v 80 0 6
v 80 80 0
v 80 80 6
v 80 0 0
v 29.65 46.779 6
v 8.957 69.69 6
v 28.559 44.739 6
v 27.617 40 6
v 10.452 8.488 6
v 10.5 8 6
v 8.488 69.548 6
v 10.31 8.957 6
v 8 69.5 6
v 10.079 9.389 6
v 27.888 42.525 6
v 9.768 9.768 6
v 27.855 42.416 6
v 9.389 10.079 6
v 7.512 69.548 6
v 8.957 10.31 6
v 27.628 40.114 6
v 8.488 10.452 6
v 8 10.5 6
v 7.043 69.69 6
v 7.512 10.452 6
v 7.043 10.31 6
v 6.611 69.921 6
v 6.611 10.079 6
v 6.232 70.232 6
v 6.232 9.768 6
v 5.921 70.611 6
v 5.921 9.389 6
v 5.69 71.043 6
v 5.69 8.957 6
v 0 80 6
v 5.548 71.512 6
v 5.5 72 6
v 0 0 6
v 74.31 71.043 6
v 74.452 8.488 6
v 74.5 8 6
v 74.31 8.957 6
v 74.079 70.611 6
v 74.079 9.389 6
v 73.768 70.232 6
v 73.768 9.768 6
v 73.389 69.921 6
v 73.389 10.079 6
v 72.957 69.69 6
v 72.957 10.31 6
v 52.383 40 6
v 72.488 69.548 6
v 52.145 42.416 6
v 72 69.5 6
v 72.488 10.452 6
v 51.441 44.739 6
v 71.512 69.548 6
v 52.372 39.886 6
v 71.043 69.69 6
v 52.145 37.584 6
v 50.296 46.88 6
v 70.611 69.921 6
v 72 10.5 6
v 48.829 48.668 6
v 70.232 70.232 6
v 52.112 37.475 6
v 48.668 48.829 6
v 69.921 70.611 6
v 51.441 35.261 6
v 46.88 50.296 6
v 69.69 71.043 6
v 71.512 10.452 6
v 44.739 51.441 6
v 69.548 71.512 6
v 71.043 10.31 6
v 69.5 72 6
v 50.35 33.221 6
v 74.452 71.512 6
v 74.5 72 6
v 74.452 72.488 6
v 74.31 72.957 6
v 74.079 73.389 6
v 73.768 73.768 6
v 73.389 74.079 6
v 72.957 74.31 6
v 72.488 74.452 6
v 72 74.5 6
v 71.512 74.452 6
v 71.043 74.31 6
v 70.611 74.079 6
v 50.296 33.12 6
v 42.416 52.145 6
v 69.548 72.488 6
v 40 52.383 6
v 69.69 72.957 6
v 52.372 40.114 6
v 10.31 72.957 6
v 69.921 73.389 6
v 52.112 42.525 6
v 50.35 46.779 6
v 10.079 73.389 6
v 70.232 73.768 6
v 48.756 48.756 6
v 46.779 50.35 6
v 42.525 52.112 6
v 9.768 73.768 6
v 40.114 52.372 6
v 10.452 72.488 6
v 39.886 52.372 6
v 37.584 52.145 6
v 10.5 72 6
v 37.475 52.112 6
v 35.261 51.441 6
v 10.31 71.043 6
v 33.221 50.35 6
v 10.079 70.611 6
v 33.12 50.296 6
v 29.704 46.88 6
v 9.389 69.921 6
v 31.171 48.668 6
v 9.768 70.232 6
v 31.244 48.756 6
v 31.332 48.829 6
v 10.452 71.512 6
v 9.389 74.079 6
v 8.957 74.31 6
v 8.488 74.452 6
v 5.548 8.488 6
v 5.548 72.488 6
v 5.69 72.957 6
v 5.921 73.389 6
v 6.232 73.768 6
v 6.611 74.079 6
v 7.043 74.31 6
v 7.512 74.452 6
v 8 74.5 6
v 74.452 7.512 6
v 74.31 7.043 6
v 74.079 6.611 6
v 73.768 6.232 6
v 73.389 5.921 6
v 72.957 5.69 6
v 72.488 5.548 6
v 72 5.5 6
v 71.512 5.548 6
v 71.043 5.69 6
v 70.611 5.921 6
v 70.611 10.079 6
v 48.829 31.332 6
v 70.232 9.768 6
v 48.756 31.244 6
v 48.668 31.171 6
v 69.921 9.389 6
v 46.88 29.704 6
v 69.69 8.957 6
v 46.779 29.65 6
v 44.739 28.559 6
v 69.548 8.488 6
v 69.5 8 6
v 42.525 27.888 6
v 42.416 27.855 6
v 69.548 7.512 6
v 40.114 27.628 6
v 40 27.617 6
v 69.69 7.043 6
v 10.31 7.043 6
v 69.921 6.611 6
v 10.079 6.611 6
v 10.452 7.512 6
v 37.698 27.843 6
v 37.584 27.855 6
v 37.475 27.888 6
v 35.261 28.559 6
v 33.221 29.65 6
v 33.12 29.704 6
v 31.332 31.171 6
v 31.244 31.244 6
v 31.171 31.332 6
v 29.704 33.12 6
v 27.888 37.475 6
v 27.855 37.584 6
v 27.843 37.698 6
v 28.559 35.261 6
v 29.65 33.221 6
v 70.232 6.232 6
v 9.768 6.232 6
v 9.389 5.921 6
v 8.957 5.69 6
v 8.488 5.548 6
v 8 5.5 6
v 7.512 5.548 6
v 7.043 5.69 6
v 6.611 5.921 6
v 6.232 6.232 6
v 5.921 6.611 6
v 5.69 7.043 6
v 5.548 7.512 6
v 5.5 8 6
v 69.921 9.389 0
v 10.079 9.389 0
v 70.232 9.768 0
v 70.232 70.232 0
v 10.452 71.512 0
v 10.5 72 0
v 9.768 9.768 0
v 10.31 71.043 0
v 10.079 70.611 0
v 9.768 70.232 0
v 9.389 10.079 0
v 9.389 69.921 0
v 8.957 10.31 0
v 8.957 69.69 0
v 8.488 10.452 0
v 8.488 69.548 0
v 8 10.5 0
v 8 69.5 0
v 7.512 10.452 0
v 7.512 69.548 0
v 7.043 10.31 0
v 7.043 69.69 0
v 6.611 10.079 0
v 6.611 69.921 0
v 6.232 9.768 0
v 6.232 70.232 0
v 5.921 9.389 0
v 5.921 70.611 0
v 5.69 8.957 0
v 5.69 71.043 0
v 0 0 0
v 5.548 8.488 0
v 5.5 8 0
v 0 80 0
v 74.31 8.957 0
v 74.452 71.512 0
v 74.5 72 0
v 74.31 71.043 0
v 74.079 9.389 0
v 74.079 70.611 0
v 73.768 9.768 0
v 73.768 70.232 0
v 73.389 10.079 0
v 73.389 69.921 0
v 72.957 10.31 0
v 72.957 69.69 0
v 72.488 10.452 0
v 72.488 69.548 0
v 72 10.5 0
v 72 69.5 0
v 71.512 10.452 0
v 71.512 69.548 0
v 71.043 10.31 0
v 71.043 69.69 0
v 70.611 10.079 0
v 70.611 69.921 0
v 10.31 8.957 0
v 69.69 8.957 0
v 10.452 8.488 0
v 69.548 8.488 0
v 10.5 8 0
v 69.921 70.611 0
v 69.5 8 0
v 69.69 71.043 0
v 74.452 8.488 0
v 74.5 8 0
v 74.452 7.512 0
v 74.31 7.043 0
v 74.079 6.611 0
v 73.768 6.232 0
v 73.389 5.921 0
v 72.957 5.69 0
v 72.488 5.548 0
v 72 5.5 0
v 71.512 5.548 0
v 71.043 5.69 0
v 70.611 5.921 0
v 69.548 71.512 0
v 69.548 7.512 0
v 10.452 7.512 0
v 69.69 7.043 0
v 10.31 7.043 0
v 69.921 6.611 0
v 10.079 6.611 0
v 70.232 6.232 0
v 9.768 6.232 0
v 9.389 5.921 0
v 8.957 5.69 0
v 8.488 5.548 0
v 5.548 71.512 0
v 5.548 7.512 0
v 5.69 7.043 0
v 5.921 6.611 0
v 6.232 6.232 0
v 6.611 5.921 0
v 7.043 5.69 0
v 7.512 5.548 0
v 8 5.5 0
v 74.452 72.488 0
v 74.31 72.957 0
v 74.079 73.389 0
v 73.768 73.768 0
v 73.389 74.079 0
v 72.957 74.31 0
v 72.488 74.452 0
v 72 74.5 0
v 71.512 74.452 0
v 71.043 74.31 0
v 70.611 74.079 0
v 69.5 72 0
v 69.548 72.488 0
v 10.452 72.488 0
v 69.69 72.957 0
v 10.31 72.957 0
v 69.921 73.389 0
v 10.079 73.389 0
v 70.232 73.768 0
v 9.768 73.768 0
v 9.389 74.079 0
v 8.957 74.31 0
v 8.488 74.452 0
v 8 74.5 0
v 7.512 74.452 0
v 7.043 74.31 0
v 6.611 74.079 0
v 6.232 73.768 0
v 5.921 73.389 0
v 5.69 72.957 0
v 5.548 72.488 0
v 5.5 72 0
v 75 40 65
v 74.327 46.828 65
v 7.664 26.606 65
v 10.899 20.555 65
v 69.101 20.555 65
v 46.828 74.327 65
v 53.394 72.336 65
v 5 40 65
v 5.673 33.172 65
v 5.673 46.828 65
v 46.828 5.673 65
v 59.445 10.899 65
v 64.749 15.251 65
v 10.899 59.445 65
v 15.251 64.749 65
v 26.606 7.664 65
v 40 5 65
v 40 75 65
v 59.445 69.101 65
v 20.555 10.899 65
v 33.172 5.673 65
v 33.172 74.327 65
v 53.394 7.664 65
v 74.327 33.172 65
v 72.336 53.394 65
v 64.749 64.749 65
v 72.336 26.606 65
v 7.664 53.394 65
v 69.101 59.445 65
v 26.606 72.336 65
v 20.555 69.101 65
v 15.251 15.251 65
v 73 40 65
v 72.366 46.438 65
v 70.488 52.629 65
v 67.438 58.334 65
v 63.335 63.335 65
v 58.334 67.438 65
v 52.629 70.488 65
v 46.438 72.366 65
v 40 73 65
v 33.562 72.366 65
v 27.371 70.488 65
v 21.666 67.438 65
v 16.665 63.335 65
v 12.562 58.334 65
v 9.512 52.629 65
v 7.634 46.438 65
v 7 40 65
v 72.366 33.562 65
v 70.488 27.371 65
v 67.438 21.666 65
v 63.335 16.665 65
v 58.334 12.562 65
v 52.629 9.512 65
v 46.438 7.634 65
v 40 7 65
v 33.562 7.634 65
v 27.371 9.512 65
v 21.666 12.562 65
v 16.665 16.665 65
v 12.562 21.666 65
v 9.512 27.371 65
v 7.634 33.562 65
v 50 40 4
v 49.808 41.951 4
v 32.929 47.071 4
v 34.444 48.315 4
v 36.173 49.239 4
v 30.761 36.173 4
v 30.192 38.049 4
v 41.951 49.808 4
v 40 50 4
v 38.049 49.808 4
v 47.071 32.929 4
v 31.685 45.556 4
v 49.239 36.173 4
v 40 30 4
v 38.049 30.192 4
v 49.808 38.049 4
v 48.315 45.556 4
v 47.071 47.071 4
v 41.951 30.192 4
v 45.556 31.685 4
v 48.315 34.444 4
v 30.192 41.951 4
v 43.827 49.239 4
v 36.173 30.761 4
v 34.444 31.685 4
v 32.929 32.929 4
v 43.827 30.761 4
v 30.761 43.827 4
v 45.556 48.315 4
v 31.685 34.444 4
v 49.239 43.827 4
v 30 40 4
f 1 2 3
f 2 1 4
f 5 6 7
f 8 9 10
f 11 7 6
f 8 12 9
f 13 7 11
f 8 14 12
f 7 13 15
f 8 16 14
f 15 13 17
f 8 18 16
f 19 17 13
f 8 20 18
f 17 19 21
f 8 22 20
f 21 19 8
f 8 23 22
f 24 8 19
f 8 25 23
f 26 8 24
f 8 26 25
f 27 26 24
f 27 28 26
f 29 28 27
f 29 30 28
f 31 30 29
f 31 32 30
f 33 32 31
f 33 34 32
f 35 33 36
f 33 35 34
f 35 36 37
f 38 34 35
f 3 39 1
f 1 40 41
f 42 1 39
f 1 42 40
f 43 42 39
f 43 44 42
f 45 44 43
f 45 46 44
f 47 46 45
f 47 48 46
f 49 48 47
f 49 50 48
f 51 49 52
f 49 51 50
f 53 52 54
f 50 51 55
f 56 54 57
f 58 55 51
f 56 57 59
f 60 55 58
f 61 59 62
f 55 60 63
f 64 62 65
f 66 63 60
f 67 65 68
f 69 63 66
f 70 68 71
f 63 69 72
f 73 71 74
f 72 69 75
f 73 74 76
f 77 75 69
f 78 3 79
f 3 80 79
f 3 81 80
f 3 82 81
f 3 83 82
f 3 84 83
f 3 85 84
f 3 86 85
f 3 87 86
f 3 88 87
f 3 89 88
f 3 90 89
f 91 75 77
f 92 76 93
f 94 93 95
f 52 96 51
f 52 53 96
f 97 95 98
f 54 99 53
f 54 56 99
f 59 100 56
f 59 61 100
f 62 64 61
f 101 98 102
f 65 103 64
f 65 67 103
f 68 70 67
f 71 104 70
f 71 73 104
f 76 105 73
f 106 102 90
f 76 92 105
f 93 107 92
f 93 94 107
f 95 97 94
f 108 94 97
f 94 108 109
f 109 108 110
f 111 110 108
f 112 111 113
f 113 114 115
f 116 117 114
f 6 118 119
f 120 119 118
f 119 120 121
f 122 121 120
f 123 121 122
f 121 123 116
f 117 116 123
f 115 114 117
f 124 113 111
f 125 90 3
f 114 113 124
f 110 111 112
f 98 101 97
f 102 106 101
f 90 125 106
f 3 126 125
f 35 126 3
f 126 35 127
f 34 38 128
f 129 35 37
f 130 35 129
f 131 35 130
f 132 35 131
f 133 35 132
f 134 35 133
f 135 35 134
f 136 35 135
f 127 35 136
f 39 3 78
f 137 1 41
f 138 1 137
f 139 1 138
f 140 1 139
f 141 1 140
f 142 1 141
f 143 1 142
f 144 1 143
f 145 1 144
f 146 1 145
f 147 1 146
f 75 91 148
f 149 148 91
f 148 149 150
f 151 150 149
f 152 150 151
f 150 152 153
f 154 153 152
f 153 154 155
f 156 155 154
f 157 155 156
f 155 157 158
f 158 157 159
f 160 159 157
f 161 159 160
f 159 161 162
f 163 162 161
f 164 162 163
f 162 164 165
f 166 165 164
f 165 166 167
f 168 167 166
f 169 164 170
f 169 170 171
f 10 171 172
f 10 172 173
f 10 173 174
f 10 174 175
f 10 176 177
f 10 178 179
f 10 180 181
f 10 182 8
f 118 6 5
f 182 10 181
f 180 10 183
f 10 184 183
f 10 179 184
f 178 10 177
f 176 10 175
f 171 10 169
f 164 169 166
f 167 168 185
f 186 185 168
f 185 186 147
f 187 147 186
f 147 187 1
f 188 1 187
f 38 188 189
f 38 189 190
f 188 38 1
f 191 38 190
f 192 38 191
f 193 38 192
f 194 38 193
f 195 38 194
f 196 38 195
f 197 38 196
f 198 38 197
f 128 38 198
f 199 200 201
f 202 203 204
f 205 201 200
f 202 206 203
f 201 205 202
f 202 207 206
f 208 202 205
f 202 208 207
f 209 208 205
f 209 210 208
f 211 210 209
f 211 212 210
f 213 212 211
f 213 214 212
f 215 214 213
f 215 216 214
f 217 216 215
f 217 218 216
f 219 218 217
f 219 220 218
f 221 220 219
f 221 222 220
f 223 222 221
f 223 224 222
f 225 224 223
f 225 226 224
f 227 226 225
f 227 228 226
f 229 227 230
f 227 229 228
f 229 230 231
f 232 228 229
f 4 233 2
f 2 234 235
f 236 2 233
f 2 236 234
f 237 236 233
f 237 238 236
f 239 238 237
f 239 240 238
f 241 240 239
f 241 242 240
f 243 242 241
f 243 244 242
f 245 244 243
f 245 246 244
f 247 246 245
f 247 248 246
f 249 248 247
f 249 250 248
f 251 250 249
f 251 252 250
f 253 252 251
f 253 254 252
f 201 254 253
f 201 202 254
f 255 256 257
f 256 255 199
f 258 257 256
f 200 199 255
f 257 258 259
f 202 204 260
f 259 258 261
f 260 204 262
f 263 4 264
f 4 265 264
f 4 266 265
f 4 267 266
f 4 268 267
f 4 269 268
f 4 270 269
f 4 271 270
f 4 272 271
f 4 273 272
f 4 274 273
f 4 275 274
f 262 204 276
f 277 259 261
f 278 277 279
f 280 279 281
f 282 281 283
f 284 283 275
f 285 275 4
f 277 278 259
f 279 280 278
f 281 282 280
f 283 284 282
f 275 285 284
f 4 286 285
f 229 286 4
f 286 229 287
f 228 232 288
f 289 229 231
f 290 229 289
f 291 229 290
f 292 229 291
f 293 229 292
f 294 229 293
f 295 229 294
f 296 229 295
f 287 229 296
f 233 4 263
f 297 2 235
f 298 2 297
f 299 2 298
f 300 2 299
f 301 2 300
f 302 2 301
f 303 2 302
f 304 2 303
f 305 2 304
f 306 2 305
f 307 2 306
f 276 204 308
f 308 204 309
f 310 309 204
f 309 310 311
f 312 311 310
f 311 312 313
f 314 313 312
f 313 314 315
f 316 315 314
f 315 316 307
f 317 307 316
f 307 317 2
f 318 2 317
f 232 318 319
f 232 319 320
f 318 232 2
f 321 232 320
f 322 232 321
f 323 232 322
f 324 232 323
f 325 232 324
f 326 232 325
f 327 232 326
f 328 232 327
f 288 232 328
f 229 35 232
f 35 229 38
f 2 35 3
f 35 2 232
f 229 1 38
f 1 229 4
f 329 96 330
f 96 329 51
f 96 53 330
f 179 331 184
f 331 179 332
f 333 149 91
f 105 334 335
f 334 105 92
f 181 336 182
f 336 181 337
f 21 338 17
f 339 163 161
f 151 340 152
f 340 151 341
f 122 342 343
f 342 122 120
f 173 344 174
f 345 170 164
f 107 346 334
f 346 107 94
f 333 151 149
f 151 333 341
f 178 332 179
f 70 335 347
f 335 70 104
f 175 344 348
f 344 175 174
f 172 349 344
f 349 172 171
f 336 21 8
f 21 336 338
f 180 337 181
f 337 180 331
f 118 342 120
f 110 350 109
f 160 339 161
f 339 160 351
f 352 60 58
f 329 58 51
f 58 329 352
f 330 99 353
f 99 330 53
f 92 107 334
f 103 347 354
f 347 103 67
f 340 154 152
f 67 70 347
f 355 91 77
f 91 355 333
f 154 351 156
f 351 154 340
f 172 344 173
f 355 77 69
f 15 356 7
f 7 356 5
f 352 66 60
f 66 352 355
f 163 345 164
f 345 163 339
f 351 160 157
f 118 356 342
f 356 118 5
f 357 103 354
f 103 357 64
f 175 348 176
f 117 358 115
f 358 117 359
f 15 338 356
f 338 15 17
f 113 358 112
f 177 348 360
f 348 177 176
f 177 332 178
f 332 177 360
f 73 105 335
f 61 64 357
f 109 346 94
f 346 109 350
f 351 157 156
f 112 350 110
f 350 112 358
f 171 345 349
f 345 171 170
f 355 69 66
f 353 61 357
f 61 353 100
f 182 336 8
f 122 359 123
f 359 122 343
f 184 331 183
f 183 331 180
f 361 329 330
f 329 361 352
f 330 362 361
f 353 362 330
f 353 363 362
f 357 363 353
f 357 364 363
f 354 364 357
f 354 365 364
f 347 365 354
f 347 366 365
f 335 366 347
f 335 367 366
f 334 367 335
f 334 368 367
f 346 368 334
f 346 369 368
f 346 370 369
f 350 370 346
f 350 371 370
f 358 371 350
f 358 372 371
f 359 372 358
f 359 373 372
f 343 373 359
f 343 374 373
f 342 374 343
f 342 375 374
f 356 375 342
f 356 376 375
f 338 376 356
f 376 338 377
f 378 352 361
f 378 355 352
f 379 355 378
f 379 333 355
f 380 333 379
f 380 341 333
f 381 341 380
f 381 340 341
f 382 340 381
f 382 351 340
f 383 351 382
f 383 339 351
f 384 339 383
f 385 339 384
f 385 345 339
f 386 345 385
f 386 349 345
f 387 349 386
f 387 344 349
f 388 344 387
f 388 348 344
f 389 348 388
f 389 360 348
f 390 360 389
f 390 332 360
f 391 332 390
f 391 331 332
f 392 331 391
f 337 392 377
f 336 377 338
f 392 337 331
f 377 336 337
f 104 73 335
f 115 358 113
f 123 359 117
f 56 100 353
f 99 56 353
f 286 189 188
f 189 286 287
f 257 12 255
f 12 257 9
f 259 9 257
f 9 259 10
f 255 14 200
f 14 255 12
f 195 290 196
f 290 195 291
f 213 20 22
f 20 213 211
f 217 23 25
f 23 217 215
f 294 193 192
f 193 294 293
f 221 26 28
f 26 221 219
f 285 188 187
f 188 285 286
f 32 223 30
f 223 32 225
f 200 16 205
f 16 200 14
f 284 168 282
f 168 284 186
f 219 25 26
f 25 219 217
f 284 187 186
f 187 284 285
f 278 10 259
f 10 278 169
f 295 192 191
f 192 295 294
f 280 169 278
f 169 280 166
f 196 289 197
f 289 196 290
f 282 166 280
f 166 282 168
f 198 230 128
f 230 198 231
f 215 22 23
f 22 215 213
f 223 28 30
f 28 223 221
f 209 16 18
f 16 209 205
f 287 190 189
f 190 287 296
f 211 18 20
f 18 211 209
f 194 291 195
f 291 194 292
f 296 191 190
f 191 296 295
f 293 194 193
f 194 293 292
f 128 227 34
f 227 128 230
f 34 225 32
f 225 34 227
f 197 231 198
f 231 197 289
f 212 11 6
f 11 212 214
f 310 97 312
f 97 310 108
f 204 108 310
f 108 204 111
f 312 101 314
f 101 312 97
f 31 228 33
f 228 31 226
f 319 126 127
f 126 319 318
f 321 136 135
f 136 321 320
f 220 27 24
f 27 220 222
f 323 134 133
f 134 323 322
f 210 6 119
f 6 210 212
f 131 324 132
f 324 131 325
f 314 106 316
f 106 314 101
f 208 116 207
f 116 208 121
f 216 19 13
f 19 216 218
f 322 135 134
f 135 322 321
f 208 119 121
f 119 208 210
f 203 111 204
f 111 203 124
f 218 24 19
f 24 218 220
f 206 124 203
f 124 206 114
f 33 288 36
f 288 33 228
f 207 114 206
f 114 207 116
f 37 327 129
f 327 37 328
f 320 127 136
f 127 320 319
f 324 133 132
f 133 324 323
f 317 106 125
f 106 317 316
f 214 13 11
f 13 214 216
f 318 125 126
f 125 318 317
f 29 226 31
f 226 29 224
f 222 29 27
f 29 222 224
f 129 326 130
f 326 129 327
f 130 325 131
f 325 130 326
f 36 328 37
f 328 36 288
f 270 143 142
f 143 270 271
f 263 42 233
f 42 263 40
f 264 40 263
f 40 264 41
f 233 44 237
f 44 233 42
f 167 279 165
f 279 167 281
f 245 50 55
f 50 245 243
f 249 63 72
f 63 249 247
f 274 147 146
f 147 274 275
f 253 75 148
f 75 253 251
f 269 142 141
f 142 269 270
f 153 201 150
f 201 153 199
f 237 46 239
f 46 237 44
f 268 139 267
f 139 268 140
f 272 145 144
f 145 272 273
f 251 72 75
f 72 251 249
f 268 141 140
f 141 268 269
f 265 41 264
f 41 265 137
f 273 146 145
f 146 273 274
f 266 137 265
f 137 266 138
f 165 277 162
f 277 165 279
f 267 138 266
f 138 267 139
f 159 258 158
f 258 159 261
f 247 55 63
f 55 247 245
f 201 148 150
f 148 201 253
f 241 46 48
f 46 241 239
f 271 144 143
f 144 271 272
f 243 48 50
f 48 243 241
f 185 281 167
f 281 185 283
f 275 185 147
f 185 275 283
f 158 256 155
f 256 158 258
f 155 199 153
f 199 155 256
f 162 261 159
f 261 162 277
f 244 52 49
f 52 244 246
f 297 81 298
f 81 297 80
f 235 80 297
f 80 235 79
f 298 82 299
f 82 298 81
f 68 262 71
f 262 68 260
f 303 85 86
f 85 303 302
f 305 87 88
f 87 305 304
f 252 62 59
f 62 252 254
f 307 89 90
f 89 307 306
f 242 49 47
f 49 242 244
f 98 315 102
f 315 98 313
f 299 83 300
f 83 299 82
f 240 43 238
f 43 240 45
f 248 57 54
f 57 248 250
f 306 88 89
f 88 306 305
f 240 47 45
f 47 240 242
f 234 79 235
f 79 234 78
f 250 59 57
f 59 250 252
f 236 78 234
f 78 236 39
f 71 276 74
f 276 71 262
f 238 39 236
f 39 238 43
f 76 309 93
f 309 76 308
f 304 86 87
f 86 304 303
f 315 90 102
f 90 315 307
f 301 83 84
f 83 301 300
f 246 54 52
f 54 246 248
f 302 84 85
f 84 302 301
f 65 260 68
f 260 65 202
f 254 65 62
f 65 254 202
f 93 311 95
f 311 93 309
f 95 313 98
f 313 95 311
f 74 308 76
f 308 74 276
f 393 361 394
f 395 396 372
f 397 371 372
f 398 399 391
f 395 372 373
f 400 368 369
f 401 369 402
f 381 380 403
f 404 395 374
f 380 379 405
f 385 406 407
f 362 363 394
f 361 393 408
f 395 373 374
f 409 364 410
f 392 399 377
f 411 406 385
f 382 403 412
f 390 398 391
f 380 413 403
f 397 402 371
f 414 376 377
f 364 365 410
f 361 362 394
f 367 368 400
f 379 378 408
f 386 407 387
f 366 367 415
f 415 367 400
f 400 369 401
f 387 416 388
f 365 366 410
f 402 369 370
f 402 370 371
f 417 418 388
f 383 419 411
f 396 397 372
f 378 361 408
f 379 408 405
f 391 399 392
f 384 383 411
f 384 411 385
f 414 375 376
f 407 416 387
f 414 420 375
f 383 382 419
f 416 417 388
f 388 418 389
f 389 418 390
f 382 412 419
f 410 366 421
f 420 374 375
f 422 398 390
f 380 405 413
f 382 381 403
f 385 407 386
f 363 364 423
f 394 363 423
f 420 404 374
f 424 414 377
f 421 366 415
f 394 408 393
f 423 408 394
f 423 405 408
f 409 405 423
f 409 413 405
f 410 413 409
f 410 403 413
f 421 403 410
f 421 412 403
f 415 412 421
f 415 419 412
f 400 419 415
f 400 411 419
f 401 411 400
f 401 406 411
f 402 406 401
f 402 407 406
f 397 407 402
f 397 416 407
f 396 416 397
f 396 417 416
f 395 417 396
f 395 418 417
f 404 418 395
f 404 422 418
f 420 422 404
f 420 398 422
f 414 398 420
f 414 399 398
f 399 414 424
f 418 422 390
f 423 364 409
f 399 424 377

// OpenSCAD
$fn = 32;

// ----------------------------------------------------------------------
// Hopper: flanged with square flange
// ----------------------------------------------------------------------

// --- parameters (mm) ---
fl = 80;                  // flange side, X and Y
fl_t = 6;                 // flange thickness
cone_h = 60;              // cone height above the flange
top_d = 70;               // cone mouth diameter
bot_d = 24;               // cone spout diameter
wall = 2;                 // cone wall thickness
hole_r = 2.5;             // flange hole radius
hole_in = 8;              // hole inset from the corners

bore_d = bot_d - 2 * wall;  // spout bore diameter
total_h = fl_t + cone_h - 1;  // overall height

difference() {
  union() {
    cube([fl, fl, fl_t]);
    translate([fl / 2, fl / 2, fl_t - 1])
      cylinder(h = cone_h, d1 = bot_d, d2 = top_d);
  }
  translate([fl / 2, fl / 2, fl_t - 2])
    cylinder(h = cone_h + 1, d1 = bore_d, d2 = top_d - 2 * wall);
  for (sx = [0, 1], sy = [0, 1])
    translate([sx ? fl - hole_in : hole_in,
               sy ? fl - hole_in : hole_in, -1])
      cylinder(r = hole_r, h = fl_t + 2);
}
